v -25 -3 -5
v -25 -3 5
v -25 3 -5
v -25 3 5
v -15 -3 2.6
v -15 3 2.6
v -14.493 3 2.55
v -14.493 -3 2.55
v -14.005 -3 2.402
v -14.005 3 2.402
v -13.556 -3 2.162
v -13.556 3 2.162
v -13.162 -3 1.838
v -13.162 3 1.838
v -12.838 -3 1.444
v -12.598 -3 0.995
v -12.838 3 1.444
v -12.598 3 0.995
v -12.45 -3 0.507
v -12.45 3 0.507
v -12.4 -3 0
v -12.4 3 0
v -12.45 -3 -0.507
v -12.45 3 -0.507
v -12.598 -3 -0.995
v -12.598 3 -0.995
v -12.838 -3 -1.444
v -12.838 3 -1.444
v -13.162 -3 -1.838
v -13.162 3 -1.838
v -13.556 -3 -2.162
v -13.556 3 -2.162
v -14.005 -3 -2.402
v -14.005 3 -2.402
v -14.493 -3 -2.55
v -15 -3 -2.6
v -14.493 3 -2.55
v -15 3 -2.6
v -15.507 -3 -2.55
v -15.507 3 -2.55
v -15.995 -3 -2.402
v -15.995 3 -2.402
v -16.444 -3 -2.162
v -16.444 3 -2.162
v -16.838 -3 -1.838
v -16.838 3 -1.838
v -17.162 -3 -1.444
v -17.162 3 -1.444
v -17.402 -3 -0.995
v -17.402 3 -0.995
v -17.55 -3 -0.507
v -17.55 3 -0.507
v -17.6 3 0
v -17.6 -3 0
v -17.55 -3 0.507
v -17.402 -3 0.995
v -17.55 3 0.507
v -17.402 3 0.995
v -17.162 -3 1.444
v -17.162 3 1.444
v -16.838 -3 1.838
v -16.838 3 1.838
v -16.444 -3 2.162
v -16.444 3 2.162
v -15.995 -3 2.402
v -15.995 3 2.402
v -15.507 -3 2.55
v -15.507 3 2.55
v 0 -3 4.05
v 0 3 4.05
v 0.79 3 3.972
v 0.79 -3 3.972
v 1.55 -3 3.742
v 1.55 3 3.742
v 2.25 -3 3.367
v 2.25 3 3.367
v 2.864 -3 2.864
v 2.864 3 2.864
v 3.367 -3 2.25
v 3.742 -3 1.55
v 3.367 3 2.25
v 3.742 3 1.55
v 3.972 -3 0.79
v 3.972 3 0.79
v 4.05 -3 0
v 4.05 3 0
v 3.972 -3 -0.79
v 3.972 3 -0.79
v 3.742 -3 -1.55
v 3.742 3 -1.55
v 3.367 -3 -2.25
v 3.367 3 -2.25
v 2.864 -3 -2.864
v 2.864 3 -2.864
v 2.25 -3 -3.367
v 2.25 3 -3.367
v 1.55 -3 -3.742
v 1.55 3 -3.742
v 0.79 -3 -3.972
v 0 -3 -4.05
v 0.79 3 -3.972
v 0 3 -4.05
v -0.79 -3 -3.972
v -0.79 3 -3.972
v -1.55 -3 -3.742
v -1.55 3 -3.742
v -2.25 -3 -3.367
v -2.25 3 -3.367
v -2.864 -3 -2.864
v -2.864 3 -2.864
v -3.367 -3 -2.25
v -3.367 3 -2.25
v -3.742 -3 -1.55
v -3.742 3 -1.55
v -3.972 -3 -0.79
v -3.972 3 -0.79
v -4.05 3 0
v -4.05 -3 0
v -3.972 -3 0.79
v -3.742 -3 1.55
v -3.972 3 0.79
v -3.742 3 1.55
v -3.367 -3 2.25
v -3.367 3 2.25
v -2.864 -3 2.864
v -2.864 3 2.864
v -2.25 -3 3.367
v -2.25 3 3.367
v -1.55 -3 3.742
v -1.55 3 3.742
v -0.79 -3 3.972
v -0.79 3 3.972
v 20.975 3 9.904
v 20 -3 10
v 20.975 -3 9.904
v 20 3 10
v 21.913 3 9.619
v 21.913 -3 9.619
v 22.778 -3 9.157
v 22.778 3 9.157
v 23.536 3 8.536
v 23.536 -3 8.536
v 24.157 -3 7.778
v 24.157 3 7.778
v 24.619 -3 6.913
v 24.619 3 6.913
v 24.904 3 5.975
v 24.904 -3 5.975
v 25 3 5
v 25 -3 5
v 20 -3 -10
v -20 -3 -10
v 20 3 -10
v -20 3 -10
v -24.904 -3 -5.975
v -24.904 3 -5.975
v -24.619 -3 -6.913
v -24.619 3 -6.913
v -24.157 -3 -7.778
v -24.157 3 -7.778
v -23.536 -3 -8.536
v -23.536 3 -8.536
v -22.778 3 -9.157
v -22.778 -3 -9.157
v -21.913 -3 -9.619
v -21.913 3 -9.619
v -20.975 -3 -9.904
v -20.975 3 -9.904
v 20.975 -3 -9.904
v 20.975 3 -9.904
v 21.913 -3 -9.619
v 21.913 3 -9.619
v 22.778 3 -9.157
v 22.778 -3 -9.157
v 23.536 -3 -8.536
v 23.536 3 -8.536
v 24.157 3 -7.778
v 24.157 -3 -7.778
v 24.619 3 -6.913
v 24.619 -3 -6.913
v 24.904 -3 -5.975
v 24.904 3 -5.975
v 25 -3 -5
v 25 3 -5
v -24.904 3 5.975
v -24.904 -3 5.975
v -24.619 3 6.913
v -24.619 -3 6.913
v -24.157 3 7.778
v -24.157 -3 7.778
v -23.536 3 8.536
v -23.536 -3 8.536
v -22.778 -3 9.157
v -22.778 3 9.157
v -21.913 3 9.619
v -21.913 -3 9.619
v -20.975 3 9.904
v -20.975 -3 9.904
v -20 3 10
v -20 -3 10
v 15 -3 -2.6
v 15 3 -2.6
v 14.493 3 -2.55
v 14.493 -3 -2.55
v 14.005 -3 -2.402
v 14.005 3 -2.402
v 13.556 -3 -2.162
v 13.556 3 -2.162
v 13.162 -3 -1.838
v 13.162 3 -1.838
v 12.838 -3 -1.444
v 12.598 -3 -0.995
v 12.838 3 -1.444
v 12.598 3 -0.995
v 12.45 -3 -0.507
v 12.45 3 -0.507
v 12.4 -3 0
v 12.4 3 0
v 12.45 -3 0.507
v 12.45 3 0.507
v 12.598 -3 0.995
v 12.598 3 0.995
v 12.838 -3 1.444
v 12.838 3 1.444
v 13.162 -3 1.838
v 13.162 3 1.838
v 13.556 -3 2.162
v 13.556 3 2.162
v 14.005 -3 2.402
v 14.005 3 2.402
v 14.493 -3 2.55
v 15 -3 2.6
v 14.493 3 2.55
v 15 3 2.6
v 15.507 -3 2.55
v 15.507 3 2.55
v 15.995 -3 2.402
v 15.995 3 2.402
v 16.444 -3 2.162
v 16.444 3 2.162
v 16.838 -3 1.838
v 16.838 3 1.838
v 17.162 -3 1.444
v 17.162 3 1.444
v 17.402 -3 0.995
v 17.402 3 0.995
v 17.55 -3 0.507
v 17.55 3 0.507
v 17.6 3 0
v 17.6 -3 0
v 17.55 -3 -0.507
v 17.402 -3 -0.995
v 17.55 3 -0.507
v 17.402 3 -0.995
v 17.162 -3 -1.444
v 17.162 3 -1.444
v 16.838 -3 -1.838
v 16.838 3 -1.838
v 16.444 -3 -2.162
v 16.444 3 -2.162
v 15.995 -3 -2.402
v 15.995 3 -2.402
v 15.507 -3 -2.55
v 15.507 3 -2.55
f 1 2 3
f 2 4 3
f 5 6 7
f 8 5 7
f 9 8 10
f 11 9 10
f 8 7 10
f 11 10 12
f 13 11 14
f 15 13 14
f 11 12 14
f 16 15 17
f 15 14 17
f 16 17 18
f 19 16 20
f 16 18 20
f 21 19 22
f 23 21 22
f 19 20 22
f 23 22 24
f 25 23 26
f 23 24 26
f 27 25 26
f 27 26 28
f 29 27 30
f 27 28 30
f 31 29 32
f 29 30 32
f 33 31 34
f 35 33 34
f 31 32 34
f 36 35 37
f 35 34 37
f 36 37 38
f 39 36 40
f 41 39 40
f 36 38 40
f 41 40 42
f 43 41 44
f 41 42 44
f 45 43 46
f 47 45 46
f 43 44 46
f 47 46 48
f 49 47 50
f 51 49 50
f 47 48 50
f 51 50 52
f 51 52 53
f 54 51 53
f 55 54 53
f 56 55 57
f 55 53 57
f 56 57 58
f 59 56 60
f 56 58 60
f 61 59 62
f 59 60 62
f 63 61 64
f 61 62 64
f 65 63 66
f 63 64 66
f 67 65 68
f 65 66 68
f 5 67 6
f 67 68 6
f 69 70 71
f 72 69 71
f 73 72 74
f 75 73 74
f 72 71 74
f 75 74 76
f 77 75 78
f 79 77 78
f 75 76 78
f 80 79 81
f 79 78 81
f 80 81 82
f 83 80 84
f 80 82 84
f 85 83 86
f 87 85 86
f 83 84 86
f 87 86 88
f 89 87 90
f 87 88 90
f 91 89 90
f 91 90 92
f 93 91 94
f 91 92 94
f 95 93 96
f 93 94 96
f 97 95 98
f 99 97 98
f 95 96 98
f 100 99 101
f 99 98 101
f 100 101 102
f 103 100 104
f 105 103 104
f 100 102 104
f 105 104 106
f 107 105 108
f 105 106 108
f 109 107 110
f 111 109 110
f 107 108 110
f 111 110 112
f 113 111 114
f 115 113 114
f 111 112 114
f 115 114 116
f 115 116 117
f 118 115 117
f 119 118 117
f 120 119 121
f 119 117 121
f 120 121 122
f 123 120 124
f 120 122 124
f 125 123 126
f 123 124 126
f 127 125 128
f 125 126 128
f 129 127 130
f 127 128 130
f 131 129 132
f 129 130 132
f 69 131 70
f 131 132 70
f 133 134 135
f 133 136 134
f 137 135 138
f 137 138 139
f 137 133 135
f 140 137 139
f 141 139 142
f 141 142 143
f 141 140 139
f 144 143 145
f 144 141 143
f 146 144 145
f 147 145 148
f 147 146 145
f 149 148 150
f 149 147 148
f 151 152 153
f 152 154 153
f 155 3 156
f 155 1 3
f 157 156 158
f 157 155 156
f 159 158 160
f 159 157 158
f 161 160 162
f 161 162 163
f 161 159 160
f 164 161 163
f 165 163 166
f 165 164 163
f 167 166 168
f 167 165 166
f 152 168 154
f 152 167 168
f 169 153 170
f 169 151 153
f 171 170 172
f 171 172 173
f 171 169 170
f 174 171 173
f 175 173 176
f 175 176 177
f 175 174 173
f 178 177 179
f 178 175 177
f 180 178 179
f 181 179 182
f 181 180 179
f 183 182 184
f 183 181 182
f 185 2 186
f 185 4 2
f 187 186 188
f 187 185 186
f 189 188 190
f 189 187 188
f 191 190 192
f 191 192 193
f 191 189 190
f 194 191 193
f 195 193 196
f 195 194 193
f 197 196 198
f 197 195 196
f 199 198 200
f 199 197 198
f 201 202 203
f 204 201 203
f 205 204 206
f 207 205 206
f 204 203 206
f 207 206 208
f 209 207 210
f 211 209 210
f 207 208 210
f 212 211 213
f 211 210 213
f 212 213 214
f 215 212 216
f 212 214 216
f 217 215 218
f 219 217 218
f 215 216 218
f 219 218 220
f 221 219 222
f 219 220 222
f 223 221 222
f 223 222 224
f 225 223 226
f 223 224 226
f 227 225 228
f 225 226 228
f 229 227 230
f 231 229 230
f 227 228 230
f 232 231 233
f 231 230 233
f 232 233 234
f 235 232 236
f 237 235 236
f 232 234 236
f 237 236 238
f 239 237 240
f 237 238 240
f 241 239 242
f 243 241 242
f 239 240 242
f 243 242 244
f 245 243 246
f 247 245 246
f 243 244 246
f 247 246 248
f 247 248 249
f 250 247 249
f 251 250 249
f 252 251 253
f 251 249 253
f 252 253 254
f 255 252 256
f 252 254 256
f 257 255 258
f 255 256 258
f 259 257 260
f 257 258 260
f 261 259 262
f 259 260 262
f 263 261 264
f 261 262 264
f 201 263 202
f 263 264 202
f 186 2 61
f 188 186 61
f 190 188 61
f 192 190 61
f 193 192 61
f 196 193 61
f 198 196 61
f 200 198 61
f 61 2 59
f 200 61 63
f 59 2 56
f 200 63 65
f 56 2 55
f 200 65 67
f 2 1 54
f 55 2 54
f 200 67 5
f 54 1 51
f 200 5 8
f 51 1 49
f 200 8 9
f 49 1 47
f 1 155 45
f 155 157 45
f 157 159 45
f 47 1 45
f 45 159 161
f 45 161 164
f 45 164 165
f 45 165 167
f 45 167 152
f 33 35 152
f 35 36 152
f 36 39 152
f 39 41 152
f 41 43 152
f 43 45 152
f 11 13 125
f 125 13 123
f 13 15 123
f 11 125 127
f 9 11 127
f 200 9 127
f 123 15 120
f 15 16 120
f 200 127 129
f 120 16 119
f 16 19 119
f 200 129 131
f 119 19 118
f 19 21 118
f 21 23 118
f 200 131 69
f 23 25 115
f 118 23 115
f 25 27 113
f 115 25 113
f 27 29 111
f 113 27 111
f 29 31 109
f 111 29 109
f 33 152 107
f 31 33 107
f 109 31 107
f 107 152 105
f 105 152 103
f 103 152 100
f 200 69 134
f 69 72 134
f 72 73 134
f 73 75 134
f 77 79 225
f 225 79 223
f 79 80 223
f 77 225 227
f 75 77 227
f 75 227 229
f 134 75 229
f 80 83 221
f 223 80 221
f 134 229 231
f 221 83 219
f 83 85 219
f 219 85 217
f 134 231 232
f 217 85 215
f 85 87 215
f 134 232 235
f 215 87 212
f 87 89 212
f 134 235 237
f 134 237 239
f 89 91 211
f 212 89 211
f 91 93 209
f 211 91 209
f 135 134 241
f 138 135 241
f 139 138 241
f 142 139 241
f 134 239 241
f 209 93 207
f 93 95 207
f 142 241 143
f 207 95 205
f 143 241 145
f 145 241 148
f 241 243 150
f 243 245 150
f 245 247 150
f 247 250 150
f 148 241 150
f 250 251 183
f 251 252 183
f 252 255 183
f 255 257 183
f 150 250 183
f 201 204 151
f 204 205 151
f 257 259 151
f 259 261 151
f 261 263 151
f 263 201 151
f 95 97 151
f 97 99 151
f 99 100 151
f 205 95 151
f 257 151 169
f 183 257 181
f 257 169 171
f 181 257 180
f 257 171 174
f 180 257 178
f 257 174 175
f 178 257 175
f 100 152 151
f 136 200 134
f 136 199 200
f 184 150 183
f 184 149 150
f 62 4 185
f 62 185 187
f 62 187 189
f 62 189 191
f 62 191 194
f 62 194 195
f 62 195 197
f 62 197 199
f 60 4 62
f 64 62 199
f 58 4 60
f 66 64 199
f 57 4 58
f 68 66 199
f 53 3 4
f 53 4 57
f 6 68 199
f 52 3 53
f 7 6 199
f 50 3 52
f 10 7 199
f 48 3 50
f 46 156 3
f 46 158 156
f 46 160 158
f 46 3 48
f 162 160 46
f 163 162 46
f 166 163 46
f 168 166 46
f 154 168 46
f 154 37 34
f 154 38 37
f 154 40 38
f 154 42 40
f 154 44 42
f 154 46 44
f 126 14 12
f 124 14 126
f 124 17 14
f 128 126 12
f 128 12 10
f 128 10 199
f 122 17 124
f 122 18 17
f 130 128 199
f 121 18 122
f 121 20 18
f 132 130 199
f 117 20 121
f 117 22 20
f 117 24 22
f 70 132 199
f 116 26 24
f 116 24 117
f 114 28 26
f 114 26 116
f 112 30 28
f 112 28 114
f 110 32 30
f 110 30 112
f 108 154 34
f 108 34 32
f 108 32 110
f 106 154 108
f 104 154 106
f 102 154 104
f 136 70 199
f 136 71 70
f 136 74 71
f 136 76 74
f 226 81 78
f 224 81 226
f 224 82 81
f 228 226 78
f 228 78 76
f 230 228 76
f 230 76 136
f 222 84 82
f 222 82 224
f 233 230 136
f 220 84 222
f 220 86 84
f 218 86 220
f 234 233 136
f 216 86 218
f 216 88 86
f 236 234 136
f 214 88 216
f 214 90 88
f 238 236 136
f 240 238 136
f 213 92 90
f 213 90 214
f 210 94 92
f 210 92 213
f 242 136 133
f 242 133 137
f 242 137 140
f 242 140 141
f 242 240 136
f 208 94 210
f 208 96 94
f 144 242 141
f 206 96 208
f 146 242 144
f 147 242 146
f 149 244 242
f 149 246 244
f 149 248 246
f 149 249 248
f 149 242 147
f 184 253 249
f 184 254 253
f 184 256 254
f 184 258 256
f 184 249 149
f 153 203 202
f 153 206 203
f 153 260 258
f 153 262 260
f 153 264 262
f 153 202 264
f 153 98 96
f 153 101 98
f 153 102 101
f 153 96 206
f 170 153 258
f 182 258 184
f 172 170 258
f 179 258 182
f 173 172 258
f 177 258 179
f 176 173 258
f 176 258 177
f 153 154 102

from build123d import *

# Parameters (mm, degrees)
ESBO_O1_W                = 50
ESBO_O1_H                = 20
RESSALTO_EXTRUS_O1_DEPTH = 3
ESBO_O3_R                = 4.05
ESBO_O3_R_2              = 2.6
CORTE_EXTRUS_O1_DEPTH    = 6
FILETE1_R                = 5


with BuildPart() as part:
    # Esboço1 → Ressalto-extrusão1 (new, symmetric)
    with BuildSketch(Plane(origin=(0, 0, 0), x_dir=(1, 0, 0), z_dir=(0, 1, 0))):
        Rectangle(ESBO_O1_W, ESBO_O1_H)
    extrude(amount=RESSALTO_EXTRUS_O1_DEPTH, both=True)

    # Esboço3 → Corte-extrusão1 (cut)
    with BuildSketch(Plane(origin=(0, 3, 0), x_dir=(1, 0, 0), z_dir=(0, 1, 0))):
        with Locations(Location((0, 0, 0), (0, 0, 270))):
            Circle(ESBO_O3_R)
        with Locations(Location((-15, 0, 0), (0, 0, 270))):
            Circle(ESBO_O3_R_2)
        with Locations(Location((15, 0, 0), (0, 0, 90))):
            Circle(ESBO_O3_R_2)
    extrude(amount=-CORTE_EXTRUS_O1_DEPTH, mode=Mode.SUBTRACT)

    # Filete1
    filete1_edges = [part.edges().sort_by_distance(p)[0] for p in [
        (25, 0, 10),
        (-25, 0, 10),
        (-25, 0, -10),
        (25, 0, -10),
    ]]
    fillet(filete1_edges, radius=FILETE1_R)


solid = part.part
